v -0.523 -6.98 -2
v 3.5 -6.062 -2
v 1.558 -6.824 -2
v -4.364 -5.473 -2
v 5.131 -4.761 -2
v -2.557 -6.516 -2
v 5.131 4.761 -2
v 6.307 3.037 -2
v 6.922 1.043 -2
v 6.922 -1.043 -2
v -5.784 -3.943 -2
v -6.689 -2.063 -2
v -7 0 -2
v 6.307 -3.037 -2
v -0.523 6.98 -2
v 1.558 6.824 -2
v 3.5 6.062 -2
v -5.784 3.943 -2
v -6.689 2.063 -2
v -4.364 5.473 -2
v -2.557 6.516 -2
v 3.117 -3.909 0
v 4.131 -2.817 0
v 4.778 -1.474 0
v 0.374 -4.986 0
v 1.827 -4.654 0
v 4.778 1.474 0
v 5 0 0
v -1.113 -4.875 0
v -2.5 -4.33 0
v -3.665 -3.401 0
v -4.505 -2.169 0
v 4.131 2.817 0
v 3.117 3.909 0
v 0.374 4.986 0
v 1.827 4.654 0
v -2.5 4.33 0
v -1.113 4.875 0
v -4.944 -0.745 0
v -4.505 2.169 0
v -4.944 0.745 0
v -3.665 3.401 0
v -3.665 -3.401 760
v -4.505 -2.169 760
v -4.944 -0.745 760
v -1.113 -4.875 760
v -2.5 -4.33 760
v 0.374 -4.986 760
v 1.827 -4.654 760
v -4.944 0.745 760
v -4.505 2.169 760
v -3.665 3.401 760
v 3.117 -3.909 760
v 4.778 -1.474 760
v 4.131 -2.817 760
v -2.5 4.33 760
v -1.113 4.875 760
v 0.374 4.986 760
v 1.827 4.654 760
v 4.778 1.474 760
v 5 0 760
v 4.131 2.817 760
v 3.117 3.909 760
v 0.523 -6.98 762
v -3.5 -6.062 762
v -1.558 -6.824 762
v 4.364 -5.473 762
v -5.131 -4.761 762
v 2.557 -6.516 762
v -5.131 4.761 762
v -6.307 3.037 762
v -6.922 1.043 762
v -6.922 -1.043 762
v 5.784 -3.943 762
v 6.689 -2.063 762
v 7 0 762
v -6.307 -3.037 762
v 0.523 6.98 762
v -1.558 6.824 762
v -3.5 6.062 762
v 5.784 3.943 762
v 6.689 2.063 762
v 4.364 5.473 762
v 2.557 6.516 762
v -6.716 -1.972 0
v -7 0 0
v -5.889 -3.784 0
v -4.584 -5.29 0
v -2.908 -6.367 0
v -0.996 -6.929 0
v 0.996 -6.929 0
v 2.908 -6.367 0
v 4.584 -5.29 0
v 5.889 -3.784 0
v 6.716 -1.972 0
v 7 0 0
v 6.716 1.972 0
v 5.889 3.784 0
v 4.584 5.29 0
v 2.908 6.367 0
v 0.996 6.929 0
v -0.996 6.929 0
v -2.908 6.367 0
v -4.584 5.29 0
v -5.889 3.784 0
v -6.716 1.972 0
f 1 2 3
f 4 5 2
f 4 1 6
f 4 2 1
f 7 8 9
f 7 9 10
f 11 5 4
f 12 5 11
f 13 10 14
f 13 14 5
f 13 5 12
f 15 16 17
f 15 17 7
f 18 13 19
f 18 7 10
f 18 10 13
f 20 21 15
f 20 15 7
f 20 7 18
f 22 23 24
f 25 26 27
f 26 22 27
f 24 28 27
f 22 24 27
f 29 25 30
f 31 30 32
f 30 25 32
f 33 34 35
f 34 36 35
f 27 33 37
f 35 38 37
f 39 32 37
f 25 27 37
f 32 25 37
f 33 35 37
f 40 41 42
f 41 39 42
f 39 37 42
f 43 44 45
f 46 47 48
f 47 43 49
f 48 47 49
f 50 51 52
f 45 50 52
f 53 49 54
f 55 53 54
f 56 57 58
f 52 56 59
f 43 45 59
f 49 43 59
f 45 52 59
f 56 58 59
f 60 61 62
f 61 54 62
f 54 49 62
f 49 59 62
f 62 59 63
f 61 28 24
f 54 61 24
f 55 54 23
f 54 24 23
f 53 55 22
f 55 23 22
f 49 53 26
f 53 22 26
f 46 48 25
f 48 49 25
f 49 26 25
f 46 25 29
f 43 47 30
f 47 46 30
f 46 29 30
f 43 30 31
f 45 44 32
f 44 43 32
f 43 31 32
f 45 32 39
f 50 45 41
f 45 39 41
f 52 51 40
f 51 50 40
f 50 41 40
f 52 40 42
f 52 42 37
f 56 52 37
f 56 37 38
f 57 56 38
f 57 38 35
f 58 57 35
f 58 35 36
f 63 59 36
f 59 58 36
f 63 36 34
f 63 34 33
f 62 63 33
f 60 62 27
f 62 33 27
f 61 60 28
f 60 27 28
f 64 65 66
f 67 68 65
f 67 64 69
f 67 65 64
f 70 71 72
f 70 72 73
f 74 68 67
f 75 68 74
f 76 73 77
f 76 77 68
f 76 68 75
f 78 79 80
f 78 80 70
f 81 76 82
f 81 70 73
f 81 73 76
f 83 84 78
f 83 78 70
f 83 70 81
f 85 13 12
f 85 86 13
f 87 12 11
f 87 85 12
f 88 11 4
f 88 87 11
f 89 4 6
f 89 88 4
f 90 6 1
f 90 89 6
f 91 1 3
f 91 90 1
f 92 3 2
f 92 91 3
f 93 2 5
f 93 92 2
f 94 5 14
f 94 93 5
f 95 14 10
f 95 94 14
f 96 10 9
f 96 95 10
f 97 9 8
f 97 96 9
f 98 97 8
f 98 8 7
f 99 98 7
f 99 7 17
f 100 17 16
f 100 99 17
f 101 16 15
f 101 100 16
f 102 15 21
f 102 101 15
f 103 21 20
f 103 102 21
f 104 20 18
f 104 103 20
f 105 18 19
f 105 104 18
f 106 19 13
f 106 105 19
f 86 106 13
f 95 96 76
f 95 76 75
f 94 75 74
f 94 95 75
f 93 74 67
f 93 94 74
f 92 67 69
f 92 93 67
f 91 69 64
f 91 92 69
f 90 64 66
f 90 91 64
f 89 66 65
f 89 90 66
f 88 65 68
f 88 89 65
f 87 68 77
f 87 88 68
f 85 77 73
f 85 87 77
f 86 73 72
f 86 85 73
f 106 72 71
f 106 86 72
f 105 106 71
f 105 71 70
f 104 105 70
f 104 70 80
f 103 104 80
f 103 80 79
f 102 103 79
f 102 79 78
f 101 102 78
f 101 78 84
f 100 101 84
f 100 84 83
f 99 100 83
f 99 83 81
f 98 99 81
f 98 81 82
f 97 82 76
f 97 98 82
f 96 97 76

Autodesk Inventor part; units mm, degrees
ref_plane "YZ Plane" through (0, 0, 0) normal (1, 0, 0) x (0, 1, 0)
ref_plane "XZ Plane" through (0, 0, 0) normal (0, 1, 0) x (-1, 0, 0)
ref_plane "XY Plane" through (0, 0, 0) normal (0, 0, 1) x (1, 0, 0)
sketch "Sketch1" plane through (0, 0, 0) normal (0, 0, 1) x (1, 0, 0)
  circle A0 centre (0, 0) radius 7
  circle A1 centre (0, 0) radius 5
  dimension "d0" = 14
  dimension "d1" = 10
extrude "Extrusion1" add sketch "Sketch1" along normal blind 760
sketch "Sketch2" plane through (0, 0, 760) normal (0, 0, 1) x (1, 0, 0)
  circle A0 centre (0, 0) radius 7 projected
extrude "Extrusion2" add sketch "Sketch2" along normal blind 2
sketch "Sketch3" plane through (0, 0, 0) normal (0, 0, -1) x (-1, 0, 0)
  circle A0 centre (0, 0) radius 7 projected
extrude "Extrusion3" add sketch "Sketch3" along normal blind 2
properties part number "cięgno fotela"
